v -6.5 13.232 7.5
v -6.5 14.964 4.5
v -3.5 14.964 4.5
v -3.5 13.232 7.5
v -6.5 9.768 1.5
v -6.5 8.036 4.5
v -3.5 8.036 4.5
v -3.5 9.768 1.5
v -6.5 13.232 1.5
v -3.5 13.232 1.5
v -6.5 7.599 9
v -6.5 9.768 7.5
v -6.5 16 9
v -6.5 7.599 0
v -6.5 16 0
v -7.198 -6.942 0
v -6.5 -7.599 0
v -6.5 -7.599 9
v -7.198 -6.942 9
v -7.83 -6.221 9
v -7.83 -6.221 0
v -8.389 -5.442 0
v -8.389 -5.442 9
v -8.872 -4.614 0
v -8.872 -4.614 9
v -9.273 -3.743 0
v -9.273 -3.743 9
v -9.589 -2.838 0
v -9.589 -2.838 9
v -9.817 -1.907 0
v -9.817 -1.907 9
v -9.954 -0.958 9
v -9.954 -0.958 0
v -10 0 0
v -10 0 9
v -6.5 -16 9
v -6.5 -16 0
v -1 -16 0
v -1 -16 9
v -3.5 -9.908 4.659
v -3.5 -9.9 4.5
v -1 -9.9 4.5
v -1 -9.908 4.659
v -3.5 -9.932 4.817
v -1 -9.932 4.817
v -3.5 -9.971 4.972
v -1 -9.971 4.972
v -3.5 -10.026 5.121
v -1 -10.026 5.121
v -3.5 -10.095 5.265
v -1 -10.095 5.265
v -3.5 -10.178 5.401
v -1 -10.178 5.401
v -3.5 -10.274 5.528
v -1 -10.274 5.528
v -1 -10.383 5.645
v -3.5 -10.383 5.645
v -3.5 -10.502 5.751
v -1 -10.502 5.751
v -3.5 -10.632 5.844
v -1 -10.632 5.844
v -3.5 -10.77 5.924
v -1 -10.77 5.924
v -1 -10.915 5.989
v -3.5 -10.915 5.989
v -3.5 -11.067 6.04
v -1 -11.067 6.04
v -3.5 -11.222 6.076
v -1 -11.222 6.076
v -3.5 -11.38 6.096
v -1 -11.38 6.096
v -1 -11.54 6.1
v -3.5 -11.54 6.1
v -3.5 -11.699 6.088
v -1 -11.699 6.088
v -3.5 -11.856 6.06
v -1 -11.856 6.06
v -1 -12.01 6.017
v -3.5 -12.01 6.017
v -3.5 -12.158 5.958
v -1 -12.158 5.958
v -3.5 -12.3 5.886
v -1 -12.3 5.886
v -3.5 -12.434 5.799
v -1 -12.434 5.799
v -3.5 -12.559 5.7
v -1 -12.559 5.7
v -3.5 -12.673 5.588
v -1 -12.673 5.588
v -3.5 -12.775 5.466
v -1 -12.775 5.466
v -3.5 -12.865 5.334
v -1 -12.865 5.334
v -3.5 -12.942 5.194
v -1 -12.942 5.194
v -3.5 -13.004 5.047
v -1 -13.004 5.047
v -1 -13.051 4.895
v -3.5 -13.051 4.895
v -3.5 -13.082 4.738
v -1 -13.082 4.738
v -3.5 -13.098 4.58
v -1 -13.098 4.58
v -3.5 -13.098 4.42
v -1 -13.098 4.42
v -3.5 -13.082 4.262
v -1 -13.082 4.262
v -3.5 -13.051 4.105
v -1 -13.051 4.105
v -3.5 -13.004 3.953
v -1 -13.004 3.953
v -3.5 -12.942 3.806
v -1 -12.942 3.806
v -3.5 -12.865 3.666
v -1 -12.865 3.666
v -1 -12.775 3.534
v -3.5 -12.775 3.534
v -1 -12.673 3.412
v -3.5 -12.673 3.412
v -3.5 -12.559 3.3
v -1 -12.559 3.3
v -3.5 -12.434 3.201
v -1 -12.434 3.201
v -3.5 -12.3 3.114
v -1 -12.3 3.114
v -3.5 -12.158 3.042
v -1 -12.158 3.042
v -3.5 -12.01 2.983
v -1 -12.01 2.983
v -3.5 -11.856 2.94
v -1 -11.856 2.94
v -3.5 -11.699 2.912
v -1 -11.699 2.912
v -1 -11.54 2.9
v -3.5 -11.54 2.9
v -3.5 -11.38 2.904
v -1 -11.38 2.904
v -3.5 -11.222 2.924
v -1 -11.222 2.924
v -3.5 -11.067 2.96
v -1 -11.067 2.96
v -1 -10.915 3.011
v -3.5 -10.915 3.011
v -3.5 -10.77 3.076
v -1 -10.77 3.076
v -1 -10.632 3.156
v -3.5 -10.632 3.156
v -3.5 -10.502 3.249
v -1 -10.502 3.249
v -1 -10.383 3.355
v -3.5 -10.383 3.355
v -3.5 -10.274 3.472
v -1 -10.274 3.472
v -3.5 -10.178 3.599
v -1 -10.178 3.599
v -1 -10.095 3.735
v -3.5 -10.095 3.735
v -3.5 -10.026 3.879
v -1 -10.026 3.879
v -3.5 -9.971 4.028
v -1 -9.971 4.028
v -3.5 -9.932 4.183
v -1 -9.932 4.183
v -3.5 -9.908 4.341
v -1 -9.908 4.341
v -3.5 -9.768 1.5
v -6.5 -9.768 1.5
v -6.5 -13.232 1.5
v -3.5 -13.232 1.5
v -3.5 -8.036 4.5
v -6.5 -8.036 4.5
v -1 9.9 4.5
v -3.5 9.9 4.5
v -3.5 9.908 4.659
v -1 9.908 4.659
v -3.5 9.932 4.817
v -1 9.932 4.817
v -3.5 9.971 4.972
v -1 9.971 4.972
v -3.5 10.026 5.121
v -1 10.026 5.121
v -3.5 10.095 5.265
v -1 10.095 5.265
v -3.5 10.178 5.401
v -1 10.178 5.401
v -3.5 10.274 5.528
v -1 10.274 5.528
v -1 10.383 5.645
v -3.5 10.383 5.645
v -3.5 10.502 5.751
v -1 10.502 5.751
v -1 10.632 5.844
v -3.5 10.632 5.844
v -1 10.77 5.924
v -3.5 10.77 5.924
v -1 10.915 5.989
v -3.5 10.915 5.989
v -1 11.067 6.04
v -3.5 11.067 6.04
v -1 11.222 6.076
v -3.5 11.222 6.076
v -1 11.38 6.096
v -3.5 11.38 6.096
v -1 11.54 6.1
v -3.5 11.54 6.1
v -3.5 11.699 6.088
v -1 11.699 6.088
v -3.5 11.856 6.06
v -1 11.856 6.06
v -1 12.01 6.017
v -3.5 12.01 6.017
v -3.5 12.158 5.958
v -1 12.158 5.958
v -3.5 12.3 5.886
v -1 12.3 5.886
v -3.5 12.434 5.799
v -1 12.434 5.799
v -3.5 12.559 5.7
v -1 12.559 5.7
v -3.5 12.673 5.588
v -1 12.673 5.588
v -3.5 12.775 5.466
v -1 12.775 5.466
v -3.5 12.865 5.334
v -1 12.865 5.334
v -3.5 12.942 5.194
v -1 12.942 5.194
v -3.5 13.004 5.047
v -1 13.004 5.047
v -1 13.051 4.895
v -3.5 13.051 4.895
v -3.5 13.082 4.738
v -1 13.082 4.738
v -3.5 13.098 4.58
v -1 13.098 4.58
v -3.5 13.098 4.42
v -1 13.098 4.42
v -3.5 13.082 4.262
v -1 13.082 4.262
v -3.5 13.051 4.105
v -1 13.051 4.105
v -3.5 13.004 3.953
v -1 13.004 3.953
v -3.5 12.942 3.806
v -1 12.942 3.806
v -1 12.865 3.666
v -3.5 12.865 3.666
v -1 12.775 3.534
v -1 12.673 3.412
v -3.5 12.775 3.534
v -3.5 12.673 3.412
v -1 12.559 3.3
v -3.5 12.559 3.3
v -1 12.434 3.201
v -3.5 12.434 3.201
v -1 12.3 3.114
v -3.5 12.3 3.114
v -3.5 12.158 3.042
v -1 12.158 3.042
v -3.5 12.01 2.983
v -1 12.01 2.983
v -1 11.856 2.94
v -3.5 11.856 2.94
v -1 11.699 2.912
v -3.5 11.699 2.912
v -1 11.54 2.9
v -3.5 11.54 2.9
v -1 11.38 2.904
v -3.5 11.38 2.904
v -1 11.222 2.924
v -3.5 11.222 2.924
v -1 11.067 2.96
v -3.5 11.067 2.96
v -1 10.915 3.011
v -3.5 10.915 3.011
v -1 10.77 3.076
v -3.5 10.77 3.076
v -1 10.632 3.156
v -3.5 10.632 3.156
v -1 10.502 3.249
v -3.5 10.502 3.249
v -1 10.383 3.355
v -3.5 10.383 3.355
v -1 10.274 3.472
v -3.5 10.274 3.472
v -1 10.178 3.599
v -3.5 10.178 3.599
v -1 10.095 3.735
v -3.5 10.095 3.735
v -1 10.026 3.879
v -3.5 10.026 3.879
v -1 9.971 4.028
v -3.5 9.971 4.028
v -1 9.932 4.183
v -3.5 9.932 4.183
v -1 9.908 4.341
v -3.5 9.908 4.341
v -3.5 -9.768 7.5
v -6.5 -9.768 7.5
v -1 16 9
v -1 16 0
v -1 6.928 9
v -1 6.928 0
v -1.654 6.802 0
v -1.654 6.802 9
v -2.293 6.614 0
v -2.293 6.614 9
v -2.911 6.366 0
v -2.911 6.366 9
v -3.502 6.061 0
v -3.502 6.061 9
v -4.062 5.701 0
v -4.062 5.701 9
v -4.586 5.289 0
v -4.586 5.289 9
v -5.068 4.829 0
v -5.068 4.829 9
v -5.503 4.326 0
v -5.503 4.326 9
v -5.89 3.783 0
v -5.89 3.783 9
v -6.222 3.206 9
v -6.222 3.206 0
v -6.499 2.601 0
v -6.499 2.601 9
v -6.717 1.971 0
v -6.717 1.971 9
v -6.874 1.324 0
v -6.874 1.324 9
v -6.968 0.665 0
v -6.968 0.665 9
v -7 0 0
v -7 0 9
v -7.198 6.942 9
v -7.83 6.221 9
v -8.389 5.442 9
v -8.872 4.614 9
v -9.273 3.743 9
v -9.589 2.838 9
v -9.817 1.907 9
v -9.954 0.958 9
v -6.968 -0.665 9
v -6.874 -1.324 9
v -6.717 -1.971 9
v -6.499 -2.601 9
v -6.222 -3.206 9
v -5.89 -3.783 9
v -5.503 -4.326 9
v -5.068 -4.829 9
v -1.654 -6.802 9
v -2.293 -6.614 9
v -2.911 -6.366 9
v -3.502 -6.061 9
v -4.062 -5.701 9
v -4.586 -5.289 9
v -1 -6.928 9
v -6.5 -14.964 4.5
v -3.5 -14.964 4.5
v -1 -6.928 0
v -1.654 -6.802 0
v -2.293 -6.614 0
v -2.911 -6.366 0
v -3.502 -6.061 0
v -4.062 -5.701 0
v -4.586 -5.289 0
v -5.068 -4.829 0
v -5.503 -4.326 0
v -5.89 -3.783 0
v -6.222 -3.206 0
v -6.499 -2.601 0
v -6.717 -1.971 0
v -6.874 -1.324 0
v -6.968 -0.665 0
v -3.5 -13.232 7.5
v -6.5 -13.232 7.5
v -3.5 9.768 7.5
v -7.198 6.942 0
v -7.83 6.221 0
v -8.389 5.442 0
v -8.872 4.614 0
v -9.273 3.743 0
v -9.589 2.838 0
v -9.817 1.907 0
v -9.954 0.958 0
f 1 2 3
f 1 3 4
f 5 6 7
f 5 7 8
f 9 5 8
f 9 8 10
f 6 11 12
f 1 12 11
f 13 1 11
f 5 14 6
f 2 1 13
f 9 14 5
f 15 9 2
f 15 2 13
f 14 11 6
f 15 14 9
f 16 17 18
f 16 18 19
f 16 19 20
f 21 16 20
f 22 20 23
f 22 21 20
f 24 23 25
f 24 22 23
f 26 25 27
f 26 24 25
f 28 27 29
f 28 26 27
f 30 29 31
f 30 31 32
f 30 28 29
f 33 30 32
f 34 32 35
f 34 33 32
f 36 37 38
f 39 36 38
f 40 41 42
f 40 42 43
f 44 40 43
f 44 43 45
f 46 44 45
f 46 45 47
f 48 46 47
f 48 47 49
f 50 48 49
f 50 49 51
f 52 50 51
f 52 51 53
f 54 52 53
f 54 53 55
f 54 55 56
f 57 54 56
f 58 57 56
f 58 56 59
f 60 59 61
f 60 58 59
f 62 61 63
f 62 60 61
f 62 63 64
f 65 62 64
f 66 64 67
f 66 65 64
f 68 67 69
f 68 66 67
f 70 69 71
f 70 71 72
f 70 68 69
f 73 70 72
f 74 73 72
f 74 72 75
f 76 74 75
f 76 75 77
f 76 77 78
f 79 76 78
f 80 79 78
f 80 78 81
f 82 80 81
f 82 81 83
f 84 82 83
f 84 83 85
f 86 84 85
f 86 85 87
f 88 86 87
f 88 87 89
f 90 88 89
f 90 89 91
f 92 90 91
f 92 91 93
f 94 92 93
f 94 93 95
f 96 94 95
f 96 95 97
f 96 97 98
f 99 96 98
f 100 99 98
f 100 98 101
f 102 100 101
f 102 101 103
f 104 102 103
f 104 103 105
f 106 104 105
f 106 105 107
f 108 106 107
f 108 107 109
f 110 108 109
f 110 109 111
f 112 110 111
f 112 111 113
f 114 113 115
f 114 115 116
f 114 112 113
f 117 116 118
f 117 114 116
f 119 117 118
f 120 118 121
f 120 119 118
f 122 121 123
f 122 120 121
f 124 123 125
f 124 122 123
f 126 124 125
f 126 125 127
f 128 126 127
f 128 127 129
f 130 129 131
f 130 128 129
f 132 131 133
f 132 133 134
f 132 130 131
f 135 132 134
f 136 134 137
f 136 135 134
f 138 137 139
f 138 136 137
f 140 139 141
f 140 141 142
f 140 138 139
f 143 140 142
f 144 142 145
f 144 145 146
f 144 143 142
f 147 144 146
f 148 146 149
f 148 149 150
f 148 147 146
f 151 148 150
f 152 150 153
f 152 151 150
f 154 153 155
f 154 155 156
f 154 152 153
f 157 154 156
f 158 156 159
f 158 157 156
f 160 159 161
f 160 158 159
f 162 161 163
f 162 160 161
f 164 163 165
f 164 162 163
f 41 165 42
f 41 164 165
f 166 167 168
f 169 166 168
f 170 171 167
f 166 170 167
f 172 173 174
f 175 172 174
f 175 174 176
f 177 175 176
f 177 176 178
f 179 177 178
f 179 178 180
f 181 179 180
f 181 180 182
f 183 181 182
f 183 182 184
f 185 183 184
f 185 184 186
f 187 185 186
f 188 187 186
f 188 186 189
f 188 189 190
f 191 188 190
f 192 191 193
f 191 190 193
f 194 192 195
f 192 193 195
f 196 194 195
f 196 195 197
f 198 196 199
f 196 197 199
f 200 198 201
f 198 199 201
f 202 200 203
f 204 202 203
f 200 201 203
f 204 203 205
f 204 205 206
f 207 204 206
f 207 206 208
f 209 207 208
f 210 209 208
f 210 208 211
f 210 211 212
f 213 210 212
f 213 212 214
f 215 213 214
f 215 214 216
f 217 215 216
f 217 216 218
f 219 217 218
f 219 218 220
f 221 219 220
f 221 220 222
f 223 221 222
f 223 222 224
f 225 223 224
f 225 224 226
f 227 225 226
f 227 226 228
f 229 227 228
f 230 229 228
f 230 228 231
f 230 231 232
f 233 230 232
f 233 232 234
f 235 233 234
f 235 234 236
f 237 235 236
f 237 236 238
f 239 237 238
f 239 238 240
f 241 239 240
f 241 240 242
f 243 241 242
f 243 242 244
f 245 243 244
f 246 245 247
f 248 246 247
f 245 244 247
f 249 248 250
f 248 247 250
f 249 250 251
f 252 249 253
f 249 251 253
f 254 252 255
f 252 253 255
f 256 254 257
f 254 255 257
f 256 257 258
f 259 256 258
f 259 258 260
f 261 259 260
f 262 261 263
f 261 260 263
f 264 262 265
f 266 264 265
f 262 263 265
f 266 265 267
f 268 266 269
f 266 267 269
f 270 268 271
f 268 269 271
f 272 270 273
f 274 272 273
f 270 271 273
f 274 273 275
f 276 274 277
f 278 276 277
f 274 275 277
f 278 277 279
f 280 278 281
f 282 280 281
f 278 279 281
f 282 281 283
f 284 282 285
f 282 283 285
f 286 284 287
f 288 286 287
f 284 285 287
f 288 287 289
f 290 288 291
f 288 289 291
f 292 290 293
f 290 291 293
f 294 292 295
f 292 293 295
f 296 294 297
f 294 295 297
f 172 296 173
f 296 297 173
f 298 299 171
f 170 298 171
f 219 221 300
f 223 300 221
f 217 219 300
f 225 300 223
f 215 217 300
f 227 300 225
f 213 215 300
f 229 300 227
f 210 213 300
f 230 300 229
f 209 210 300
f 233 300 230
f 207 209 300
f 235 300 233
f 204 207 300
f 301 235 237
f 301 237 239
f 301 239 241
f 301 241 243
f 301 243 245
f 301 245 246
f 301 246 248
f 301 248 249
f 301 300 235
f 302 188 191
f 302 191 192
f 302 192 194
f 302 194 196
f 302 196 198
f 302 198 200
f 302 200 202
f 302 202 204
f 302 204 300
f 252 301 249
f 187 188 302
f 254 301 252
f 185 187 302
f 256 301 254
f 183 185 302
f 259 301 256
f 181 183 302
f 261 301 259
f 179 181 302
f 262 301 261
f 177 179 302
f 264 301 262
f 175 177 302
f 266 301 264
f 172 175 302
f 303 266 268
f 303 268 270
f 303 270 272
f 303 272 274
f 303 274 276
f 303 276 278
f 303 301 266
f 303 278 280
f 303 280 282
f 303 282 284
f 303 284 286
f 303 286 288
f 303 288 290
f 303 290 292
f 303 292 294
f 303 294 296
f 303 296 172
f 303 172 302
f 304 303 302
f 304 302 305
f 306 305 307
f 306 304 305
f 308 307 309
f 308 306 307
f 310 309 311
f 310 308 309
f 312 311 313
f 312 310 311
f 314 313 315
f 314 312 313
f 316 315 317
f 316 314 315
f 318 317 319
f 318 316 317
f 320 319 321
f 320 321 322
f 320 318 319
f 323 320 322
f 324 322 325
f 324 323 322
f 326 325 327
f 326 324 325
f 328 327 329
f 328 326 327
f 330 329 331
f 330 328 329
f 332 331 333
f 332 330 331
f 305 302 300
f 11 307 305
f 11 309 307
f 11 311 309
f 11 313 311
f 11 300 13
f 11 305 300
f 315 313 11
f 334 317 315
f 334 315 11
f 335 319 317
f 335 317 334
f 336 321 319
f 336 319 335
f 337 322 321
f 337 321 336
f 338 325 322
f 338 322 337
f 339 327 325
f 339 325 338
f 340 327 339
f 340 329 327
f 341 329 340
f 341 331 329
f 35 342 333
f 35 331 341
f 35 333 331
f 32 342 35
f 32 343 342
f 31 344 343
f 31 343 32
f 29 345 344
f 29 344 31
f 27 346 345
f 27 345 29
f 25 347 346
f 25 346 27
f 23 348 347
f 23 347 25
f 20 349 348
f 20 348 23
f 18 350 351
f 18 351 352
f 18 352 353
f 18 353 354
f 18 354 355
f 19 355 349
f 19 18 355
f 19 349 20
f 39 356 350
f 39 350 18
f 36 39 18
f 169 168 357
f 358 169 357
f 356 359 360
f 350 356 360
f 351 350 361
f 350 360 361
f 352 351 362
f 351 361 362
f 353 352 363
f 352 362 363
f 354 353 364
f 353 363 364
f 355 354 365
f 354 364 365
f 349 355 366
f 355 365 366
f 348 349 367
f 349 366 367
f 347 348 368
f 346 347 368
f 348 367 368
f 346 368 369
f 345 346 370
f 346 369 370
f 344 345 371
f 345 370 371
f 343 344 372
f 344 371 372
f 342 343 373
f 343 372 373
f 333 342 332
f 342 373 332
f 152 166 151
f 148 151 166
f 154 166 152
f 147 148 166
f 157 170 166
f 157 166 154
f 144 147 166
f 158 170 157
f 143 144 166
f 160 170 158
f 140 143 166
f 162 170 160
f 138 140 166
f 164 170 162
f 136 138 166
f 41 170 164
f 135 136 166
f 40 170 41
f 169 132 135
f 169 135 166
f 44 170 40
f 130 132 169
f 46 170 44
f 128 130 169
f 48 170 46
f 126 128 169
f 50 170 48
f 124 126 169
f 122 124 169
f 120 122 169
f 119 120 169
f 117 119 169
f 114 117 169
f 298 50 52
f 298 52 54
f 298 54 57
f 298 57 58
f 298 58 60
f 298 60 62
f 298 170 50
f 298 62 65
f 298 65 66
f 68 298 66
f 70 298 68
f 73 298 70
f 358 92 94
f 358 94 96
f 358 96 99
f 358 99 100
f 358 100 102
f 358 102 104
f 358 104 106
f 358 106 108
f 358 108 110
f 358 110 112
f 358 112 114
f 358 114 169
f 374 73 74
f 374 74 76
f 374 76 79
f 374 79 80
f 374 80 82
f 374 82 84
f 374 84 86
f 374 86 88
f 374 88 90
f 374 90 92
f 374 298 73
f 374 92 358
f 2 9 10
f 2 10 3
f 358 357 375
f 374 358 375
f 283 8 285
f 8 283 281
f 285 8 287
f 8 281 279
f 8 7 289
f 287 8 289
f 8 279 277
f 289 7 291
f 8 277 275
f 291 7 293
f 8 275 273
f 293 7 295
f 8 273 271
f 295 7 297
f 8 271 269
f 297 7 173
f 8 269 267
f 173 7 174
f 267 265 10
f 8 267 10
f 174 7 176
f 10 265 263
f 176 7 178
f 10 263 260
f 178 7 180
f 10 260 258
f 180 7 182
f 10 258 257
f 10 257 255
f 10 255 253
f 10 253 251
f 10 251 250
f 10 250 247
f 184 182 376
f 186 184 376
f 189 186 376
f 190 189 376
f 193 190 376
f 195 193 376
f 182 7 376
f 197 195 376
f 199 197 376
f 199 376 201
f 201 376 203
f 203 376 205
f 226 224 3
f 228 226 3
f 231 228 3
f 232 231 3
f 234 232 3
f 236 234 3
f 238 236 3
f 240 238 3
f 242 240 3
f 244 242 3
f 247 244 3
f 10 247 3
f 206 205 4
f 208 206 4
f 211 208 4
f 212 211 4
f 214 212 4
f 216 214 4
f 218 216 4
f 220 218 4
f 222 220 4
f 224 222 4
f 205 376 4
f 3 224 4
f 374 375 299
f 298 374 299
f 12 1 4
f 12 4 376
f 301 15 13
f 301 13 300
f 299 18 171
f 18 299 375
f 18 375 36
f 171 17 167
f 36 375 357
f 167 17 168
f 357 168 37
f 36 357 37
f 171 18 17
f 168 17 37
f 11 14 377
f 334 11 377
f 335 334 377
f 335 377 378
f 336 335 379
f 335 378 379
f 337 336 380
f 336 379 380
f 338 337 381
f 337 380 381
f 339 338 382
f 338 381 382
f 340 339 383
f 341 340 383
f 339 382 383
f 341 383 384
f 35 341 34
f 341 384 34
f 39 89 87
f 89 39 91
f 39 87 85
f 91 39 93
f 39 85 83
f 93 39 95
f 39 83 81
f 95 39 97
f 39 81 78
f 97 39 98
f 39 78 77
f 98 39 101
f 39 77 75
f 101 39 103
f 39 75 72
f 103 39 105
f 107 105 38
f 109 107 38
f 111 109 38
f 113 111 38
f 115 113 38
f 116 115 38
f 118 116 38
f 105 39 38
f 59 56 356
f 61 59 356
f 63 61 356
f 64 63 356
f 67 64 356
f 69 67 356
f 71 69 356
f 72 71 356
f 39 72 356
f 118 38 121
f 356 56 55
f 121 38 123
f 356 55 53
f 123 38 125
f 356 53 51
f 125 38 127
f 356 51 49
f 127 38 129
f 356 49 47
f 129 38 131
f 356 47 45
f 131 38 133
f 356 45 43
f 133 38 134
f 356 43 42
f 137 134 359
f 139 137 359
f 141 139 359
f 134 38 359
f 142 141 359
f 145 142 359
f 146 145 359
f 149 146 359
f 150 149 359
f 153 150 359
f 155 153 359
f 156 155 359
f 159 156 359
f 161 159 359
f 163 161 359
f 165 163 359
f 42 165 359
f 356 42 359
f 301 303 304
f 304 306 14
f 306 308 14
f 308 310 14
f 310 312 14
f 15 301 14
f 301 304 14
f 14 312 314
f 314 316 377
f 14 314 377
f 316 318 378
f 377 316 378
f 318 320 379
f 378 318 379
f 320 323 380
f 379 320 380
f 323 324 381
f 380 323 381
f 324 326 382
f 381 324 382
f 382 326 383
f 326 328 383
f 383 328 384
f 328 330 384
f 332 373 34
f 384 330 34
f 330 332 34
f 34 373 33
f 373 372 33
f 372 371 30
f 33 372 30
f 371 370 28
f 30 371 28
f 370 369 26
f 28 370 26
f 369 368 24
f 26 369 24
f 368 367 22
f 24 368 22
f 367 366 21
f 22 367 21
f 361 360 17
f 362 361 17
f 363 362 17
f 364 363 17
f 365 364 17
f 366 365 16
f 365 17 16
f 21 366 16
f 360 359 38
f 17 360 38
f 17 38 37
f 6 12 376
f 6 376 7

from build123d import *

# Parameters (mm, degrees)
PAD_DEPTH       = 9
POCKET_DEPTH    = 3
SKETCH002_R     = 1.6
POCKET001_DEPTH = 5


with BuildPart() as pocket001:
    # Sketch → Pad (new body)
    with BuildSketch(Plane.XY):
        with BuildLine():
            ThreePointArc((-1, 6.928203), (-5.291503, 4.582576), (-7, 0))
            Line((-10, 0), (-7, 0))
            ThreePointArc((-6.5, 7.599342), (-9.082951, 4.1833), (-10, 0))
            Line((-6.5, 7.599342), (-6.5, 16))
            Line((-6.5, 16), (-1, 16))
            Line((-1, 16), (-1, 6.928203))
        make_face()
    extrude(amount=PAD_DEPTH)

    # Sketch001 → Pocket (cut)
    with BuildSketch(Plane(origin=(-6.5, 0, 0), x_dir=(0, -1, 0), z_dir=(-1, 0, 0))):
        Polygon((-13.232051, 7.5), (-9.767949, 7.5), (-8.035898, 4.5), (-9.767949, 1.5), (-13.232051, 1.5), (-14.964102, 4.5), align=None)
    extrude(amount=-POCKET_DEPTH, mode=Mode.SUBTRACT)

    # Sketch002 → Pocket001 (cut)
    with BuildSketch(Plane(origin=(-3.5, 0, 0), x_dir=(0, -1, 0), z_dir=(-1, 0, 0))):
        with Locations((-11.5, 4.5)):
            Circle(SKETCH002_R)
    extrude(amount=-POCKET001_DEPTH, mode=Mode.SUBTRACT)


with BuildPart() as part_mirroring:
    # Part__Mirroring: instance of Pocket001
    add(pocket001.part.mirror(Plane(origin=(0, 0, 0), x_dir=(1, 0, 0), z_dir=(0, 1, 0))))


with BuildPart() as fusion:
    # Fusion base: copy of Pocket001
    add(pocket001.part)

    # Fusion: union Part__Mirroring
    add(part_mirroring.part)


solid = fusion.part
